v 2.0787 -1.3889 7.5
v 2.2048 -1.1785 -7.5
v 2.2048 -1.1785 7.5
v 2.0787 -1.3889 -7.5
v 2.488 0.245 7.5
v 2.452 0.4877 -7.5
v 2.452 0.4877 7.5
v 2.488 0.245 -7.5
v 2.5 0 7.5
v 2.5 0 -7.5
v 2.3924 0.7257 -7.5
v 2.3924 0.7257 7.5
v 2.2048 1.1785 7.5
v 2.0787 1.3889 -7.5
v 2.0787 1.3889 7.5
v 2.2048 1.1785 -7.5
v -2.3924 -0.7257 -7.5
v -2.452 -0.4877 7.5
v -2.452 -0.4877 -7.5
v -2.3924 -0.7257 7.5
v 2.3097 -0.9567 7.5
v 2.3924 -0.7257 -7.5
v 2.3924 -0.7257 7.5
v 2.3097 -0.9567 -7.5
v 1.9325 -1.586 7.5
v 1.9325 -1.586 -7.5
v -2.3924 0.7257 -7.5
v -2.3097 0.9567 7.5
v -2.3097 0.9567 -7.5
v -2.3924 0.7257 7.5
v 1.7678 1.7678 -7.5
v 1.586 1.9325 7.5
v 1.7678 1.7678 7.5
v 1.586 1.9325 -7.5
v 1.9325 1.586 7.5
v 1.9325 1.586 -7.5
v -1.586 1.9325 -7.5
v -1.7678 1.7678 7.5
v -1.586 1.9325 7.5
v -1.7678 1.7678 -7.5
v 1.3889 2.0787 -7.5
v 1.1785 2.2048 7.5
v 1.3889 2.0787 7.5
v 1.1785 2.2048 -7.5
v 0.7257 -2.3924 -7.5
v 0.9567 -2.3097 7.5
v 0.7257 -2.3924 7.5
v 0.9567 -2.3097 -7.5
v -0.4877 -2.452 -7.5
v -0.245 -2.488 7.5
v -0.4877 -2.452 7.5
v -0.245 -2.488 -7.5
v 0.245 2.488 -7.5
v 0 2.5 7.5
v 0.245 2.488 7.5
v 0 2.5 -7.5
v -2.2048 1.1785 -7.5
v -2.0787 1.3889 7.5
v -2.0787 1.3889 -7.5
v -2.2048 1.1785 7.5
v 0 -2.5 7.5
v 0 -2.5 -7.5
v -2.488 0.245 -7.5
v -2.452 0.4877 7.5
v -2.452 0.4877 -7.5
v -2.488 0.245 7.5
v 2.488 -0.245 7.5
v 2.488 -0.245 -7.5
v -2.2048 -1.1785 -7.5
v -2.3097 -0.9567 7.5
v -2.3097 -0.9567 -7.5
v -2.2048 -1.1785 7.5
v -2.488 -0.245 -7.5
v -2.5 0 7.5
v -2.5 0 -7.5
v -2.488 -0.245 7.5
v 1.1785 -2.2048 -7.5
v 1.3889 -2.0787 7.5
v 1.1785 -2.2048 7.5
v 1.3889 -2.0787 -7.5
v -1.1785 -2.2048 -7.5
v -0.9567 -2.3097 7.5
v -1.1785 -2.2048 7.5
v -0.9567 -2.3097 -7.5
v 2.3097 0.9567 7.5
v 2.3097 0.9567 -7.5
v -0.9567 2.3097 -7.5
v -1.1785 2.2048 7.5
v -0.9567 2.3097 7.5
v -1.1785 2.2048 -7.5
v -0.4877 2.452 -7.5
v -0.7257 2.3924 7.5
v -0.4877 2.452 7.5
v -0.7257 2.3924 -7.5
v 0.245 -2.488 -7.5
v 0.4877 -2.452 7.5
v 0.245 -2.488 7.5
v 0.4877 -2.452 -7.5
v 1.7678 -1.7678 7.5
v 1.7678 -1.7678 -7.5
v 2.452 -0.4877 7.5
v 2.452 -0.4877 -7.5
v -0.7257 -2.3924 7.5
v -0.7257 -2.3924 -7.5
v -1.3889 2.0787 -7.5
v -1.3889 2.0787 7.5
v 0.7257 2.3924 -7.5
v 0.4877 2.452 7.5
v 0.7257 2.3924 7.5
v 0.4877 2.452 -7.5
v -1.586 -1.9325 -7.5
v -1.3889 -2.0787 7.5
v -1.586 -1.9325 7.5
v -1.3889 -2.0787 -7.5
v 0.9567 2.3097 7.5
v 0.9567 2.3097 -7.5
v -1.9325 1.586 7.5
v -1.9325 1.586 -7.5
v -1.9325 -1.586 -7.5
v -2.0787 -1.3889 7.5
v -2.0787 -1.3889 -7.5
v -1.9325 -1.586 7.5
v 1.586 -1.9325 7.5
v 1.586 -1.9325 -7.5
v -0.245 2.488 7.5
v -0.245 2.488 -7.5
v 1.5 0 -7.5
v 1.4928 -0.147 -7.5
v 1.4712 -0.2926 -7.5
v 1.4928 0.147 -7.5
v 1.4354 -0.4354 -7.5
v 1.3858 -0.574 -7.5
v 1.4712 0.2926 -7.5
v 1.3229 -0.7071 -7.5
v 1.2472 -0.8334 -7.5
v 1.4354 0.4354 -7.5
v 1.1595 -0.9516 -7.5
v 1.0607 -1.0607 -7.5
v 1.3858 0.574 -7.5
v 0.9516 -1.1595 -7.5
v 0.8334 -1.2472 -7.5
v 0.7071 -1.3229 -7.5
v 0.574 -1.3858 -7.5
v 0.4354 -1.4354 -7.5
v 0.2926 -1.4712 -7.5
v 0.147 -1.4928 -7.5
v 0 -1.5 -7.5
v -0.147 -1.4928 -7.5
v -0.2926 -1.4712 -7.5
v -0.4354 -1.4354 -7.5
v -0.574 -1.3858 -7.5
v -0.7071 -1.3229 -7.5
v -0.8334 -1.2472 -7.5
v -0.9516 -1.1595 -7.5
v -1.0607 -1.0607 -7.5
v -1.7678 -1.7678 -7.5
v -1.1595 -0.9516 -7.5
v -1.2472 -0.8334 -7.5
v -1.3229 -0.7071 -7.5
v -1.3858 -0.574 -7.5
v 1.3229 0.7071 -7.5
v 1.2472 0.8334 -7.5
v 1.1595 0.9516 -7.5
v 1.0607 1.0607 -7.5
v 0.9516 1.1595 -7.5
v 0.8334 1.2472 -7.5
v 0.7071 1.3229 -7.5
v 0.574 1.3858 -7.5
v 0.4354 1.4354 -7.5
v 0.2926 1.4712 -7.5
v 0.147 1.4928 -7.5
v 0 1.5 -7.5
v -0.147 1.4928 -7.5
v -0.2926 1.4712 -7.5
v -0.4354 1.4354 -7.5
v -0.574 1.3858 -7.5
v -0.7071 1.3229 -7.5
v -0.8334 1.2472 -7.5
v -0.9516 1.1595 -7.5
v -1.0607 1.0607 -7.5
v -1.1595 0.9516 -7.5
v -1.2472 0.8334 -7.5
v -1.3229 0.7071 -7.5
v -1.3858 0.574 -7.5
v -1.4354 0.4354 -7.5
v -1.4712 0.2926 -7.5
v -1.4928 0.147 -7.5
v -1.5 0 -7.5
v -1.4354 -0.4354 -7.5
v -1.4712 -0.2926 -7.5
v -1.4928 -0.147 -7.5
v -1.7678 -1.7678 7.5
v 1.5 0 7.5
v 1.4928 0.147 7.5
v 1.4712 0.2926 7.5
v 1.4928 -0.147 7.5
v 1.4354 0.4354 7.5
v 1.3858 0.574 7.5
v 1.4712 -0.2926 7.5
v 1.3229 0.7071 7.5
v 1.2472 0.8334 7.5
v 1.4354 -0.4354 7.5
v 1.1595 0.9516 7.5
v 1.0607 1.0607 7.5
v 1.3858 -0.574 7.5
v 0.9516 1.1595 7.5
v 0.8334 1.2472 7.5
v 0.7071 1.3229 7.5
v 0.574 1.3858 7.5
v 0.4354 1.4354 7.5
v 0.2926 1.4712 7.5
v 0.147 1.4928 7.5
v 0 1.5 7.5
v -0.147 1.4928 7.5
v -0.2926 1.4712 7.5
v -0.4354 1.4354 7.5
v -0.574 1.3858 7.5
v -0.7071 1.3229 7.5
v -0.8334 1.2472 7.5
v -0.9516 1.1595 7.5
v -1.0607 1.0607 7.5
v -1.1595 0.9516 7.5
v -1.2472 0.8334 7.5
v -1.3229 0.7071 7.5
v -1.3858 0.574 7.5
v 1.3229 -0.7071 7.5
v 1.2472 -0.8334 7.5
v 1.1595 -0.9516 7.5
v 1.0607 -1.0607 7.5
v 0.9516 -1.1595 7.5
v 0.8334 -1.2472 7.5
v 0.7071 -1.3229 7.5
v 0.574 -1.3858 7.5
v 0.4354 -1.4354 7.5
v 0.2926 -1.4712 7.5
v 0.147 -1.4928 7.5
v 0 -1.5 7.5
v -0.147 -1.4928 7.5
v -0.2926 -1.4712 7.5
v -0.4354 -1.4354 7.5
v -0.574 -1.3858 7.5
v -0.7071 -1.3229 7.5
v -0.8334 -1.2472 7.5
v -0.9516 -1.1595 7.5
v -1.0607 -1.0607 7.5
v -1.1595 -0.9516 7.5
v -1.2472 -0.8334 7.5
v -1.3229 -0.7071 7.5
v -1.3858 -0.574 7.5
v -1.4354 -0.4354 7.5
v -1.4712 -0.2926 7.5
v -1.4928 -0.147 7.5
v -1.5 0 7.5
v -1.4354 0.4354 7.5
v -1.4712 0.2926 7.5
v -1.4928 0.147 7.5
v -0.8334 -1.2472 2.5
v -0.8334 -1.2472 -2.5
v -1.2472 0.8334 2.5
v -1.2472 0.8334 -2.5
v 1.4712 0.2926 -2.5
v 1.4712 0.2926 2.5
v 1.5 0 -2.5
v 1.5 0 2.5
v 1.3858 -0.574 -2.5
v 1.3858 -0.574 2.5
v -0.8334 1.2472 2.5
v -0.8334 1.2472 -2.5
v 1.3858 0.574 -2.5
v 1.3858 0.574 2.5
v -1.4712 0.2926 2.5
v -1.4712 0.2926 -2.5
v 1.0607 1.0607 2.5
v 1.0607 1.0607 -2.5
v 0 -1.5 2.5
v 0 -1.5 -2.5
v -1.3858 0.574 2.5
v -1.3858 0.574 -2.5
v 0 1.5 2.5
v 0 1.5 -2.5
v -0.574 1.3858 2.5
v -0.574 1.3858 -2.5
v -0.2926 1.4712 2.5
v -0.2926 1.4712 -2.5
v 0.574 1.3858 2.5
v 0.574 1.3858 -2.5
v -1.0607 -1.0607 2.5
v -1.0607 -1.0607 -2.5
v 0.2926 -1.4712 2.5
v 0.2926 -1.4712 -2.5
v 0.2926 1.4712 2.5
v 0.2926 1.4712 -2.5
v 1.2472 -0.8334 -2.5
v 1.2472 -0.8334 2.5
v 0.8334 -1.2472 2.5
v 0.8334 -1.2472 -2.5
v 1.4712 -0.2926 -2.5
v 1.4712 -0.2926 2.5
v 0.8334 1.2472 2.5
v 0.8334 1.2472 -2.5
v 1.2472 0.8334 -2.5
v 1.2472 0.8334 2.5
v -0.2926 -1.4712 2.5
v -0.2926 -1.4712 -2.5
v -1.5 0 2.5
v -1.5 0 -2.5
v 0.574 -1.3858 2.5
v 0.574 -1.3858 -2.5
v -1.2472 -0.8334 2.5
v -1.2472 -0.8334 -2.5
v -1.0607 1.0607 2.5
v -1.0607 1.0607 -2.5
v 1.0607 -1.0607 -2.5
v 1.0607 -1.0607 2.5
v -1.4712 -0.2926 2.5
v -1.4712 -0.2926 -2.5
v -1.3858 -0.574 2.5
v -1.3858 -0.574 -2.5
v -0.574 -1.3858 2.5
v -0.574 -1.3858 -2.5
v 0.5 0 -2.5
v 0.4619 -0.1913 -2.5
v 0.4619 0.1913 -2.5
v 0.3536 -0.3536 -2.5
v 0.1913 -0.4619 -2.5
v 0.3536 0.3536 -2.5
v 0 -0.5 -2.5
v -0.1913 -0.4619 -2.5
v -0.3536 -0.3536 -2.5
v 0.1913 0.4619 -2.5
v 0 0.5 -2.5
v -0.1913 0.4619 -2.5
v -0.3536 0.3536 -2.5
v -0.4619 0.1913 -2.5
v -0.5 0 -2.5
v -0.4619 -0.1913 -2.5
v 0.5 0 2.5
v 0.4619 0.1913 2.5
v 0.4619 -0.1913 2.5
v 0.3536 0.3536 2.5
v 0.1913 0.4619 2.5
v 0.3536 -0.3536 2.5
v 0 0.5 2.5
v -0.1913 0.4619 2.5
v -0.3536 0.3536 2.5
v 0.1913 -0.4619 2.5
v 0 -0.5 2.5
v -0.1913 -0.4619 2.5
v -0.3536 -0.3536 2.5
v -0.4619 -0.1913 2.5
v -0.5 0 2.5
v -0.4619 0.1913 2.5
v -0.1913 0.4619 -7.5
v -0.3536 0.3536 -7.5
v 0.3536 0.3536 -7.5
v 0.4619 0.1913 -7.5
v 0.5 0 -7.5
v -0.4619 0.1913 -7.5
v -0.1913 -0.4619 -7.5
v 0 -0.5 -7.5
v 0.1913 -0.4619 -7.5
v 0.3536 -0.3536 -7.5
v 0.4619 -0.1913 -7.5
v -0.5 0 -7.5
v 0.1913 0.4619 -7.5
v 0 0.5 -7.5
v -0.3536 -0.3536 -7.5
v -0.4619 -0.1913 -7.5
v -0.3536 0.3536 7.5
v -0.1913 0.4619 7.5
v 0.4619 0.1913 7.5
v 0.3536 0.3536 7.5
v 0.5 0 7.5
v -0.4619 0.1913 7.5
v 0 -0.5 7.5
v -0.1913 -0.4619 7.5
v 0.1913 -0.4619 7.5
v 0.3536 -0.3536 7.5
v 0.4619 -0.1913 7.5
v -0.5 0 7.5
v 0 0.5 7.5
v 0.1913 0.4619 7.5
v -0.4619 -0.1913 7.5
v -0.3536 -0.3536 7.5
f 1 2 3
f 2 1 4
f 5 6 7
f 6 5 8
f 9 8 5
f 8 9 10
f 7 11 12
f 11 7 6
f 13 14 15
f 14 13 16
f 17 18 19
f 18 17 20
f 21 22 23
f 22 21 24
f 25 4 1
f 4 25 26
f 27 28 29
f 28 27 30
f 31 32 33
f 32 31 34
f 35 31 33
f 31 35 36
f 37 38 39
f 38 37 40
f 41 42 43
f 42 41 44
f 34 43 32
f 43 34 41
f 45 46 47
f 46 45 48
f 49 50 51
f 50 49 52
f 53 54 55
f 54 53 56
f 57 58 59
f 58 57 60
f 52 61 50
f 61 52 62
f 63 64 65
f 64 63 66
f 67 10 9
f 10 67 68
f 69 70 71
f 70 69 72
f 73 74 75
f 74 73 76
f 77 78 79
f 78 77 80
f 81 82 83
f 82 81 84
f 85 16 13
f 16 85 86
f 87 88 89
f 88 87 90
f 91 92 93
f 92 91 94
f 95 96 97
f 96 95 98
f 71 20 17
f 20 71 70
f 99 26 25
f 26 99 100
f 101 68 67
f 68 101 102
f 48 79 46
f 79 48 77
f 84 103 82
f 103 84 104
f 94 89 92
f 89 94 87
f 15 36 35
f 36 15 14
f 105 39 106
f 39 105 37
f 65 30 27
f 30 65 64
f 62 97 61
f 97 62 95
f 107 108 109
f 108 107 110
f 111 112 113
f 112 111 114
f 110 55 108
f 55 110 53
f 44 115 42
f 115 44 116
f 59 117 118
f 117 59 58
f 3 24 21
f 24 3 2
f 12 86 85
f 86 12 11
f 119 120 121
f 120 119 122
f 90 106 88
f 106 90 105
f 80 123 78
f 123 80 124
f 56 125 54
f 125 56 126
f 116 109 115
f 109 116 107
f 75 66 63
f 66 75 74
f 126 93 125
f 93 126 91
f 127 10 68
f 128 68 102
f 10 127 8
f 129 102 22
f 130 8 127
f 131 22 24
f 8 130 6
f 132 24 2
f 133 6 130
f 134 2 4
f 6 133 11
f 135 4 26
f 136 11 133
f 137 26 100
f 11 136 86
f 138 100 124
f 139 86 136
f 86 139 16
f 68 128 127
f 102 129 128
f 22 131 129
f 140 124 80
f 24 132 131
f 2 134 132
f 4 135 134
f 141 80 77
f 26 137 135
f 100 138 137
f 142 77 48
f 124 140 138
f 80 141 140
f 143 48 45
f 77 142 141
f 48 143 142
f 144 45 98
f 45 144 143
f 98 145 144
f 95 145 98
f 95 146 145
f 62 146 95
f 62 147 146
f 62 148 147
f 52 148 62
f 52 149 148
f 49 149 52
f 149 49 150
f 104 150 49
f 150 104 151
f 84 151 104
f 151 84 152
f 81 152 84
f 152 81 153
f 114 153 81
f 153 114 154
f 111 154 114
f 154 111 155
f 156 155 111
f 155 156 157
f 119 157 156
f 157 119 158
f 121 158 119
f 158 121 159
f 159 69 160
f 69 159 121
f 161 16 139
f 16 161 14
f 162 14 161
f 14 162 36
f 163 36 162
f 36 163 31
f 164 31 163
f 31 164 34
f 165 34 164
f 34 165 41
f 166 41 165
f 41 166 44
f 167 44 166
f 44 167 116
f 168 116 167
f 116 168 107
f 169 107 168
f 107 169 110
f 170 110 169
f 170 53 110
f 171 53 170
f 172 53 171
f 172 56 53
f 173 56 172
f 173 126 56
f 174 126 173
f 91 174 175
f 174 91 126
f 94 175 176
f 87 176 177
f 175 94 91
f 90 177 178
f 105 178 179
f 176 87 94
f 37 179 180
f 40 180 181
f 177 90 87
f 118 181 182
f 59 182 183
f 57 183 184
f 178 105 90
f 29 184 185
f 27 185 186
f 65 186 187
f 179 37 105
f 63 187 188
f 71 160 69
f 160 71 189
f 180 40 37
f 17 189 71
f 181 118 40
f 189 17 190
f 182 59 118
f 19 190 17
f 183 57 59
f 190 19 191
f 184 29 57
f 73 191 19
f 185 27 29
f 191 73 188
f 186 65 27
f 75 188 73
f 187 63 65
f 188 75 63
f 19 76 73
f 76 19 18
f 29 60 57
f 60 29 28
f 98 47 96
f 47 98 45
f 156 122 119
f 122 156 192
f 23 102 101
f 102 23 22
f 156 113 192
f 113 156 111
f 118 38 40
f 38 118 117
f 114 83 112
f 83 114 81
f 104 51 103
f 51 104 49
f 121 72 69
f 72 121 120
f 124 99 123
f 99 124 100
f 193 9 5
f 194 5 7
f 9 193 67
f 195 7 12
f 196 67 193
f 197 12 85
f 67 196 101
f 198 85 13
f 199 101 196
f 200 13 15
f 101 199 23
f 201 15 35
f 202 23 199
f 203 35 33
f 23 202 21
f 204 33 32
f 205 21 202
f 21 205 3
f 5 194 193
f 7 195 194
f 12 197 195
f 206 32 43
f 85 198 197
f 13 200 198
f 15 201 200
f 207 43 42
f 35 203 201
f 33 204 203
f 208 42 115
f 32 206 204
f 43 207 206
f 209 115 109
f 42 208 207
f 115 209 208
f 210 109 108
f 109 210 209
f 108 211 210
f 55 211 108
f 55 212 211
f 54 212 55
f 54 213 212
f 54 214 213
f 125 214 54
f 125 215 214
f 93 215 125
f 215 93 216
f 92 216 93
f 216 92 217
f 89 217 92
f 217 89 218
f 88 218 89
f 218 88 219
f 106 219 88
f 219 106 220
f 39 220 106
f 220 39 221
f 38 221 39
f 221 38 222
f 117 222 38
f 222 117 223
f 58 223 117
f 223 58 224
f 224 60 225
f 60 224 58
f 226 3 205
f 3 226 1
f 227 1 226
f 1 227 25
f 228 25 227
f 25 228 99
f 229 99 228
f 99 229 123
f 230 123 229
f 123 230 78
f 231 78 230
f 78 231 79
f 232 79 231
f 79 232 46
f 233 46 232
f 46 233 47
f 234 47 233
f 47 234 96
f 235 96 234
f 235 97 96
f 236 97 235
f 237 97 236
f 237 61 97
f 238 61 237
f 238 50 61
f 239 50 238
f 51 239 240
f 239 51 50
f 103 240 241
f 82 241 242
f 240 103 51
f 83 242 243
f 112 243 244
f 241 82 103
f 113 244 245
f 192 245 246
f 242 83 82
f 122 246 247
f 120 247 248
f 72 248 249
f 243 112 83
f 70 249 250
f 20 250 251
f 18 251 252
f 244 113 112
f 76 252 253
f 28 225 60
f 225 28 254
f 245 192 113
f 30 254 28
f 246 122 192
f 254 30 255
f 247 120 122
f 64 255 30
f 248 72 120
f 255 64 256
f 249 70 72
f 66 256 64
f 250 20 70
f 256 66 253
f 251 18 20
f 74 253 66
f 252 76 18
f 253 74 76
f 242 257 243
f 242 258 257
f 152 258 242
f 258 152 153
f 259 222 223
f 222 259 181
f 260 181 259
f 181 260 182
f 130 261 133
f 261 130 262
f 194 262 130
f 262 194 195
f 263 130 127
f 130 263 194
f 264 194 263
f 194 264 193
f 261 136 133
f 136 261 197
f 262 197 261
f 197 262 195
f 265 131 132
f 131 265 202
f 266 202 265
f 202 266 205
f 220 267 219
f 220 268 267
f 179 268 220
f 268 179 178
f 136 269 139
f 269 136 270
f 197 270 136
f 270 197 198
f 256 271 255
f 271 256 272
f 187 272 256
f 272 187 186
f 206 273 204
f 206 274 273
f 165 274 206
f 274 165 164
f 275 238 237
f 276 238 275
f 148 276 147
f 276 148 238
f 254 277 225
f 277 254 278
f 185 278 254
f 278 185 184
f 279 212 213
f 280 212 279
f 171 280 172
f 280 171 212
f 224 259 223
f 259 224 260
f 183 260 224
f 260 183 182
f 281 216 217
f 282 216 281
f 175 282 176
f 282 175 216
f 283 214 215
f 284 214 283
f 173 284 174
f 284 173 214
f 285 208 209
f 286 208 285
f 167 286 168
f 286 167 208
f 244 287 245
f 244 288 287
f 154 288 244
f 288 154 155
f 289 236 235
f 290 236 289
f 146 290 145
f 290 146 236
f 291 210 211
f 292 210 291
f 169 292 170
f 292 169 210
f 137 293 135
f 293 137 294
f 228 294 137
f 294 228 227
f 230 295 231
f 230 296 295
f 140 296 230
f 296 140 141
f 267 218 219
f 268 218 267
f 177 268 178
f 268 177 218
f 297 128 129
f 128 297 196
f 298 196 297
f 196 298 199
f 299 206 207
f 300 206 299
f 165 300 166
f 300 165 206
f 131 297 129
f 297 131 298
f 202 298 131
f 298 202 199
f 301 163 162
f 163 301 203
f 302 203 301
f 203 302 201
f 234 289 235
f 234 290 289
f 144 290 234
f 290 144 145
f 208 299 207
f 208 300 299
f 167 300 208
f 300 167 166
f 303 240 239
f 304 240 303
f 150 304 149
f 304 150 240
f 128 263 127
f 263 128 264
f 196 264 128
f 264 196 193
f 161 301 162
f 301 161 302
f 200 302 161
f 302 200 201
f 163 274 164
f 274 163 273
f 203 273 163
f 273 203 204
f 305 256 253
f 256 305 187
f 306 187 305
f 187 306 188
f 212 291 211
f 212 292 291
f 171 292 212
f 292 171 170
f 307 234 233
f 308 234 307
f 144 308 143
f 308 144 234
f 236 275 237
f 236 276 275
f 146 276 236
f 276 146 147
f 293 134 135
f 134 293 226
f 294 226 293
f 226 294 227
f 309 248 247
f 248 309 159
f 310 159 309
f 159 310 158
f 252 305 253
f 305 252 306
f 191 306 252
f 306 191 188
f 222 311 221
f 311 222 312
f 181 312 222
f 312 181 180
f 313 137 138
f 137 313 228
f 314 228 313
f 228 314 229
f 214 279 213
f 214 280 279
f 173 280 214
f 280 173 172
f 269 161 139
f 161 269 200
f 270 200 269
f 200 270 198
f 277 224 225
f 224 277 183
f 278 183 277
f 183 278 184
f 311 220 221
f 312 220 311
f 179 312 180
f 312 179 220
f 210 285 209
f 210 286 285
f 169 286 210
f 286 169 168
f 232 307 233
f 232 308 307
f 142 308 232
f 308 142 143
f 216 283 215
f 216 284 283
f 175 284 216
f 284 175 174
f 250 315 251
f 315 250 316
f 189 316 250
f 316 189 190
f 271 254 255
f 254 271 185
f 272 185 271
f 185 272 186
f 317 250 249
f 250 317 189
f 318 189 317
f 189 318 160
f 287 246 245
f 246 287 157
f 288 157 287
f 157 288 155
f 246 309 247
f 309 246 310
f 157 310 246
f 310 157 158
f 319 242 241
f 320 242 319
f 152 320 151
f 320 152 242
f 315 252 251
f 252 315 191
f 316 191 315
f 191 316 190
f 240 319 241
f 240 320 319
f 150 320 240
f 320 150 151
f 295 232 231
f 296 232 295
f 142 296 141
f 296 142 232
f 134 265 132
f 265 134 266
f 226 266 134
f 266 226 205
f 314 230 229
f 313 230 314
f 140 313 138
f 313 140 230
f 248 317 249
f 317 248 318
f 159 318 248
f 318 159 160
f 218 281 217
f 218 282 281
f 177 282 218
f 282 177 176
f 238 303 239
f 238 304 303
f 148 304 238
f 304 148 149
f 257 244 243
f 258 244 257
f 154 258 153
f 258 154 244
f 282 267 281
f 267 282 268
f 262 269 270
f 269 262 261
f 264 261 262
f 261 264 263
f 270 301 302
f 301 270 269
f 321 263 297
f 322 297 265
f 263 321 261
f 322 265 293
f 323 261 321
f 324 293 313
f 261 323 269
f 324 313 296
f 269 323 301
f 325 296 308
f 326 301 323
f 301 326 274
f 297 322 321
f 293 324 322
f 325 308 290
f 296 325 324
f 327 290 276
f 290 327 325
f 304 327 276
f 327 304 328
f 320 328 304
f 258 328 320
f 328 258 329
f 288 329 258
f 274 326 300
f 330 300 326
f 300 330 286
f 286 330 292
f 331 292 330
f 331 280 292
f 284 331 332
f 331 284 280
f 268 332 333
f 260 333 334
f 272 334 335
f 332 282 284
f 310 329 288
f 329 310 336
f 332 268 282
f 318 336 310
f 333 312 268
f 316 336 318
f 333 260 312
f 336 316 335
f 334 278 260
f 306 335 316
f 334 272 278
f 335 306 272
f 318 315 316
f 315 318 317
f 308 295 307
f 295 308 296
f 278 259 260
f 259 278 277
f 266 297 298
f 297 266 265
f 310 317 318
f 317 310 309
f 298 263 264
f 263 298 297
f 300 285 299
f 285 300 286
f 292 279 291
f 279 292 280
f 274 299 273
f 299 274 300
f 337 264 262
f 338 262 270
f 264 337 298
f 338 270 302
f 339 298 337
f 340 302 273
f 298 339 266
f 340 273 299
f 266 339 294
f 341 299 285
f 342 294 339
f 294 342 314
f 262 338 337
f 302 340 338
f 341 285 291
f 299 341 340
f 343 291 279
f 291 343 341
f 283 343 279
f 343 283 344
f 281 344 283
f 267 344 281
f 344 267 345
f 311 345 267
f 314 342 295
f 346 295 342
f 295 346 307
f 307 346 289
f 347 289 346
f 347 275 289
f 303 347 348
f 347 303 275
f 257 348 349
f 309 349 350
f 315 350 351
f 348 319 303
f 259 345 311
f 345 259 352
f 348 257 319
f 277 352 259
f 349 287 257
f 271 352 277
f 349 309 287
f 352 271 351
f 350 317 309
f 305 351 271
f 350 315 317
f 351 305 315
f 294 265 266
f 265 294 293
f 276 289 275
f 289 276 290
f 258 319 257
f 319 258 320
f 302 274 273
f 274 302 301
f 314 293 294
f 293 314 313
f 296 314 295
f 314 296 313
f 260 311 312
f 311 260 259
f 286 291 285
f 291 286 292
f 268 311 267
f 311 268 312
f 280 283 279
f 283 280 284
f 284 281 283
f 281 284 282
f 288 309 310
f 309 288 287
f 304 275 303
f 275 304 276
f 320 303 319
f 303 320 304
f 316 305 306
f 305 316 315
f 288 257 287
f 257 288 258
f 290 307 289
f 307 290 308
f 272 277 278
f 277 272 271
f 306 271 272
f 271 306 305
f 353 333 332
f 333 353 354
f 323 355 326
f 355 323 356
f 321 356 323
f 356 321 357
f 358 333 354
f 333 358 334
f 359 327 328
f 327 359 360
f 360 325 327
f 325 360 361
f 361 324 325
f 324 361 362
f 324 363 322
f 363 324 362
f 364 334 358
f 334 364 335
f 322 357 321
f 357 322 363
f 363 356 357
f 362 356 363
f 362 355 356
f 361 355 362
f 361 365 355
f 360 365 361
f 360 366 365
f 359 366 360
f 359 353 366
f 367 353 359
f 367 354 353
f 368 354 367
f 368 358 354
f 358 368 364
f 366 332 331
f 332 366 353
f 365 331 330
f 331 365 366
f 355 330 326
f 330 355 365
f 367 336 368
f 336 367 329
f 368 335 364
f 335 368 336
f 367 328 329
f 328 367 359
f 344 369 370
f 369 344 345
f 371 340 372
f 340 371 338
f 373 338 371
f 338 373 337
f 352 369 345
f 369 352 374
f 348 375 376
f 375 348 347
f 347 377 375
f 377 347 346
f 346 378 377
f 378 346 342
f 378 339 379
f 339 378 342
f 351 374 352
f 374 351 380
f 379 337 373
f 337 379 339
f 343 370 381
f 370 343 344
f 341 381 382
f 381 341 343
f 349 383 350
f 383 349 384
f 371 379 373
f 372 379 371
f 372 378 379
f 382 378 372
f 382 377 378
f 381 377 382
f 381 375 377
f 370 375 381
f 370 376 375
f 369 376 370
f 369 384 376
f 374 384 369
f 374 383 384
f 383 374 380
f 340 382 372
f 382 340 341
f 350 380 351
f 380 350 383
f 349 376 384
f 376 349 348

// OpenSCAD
// Parameters
length = 15; //[8:30:1]
center = true; //[0:1:1]
original_id = 3; //[1.5:6:0.1]
original_od = 5; //[2.5:10:0.1]
id = 3; //[1.5:20:0.1]
od = 5; //[2.5:30:0.1]

// Tubing - complete geometry
module tubing() {
  color([0.85, 0.85, 0.8]) { // Off-white for heatshrink
    difference() {
      cylinder(h=length, r=od/2, center=center, $fn=64);
      cylinder(h=length, r=id/2, center=center, $fn=64);
    }
  }
}

// Sleeved Resistor - complete geometry
module sleeved_resistor() {
  color([0.2, 0.2, 0.2]) { // Dark color for resistor body
    // Resistor body
    cylinder(h=5, r=1.5, center=true, $fn=32);
    // Leads
    translate([0, 0, -5/2-5]) cylinder(h=5, r=0.5, center=false, $fn=16);
    translate([0, 0, 5/2]) cylinder(h=5, r=0.5, center=false, $fn=16);
  }
}

// Assembly
module assembly() {
  tubing();
  translate([0, 0, 0]) sleeved_resistor();
}

assembly();
